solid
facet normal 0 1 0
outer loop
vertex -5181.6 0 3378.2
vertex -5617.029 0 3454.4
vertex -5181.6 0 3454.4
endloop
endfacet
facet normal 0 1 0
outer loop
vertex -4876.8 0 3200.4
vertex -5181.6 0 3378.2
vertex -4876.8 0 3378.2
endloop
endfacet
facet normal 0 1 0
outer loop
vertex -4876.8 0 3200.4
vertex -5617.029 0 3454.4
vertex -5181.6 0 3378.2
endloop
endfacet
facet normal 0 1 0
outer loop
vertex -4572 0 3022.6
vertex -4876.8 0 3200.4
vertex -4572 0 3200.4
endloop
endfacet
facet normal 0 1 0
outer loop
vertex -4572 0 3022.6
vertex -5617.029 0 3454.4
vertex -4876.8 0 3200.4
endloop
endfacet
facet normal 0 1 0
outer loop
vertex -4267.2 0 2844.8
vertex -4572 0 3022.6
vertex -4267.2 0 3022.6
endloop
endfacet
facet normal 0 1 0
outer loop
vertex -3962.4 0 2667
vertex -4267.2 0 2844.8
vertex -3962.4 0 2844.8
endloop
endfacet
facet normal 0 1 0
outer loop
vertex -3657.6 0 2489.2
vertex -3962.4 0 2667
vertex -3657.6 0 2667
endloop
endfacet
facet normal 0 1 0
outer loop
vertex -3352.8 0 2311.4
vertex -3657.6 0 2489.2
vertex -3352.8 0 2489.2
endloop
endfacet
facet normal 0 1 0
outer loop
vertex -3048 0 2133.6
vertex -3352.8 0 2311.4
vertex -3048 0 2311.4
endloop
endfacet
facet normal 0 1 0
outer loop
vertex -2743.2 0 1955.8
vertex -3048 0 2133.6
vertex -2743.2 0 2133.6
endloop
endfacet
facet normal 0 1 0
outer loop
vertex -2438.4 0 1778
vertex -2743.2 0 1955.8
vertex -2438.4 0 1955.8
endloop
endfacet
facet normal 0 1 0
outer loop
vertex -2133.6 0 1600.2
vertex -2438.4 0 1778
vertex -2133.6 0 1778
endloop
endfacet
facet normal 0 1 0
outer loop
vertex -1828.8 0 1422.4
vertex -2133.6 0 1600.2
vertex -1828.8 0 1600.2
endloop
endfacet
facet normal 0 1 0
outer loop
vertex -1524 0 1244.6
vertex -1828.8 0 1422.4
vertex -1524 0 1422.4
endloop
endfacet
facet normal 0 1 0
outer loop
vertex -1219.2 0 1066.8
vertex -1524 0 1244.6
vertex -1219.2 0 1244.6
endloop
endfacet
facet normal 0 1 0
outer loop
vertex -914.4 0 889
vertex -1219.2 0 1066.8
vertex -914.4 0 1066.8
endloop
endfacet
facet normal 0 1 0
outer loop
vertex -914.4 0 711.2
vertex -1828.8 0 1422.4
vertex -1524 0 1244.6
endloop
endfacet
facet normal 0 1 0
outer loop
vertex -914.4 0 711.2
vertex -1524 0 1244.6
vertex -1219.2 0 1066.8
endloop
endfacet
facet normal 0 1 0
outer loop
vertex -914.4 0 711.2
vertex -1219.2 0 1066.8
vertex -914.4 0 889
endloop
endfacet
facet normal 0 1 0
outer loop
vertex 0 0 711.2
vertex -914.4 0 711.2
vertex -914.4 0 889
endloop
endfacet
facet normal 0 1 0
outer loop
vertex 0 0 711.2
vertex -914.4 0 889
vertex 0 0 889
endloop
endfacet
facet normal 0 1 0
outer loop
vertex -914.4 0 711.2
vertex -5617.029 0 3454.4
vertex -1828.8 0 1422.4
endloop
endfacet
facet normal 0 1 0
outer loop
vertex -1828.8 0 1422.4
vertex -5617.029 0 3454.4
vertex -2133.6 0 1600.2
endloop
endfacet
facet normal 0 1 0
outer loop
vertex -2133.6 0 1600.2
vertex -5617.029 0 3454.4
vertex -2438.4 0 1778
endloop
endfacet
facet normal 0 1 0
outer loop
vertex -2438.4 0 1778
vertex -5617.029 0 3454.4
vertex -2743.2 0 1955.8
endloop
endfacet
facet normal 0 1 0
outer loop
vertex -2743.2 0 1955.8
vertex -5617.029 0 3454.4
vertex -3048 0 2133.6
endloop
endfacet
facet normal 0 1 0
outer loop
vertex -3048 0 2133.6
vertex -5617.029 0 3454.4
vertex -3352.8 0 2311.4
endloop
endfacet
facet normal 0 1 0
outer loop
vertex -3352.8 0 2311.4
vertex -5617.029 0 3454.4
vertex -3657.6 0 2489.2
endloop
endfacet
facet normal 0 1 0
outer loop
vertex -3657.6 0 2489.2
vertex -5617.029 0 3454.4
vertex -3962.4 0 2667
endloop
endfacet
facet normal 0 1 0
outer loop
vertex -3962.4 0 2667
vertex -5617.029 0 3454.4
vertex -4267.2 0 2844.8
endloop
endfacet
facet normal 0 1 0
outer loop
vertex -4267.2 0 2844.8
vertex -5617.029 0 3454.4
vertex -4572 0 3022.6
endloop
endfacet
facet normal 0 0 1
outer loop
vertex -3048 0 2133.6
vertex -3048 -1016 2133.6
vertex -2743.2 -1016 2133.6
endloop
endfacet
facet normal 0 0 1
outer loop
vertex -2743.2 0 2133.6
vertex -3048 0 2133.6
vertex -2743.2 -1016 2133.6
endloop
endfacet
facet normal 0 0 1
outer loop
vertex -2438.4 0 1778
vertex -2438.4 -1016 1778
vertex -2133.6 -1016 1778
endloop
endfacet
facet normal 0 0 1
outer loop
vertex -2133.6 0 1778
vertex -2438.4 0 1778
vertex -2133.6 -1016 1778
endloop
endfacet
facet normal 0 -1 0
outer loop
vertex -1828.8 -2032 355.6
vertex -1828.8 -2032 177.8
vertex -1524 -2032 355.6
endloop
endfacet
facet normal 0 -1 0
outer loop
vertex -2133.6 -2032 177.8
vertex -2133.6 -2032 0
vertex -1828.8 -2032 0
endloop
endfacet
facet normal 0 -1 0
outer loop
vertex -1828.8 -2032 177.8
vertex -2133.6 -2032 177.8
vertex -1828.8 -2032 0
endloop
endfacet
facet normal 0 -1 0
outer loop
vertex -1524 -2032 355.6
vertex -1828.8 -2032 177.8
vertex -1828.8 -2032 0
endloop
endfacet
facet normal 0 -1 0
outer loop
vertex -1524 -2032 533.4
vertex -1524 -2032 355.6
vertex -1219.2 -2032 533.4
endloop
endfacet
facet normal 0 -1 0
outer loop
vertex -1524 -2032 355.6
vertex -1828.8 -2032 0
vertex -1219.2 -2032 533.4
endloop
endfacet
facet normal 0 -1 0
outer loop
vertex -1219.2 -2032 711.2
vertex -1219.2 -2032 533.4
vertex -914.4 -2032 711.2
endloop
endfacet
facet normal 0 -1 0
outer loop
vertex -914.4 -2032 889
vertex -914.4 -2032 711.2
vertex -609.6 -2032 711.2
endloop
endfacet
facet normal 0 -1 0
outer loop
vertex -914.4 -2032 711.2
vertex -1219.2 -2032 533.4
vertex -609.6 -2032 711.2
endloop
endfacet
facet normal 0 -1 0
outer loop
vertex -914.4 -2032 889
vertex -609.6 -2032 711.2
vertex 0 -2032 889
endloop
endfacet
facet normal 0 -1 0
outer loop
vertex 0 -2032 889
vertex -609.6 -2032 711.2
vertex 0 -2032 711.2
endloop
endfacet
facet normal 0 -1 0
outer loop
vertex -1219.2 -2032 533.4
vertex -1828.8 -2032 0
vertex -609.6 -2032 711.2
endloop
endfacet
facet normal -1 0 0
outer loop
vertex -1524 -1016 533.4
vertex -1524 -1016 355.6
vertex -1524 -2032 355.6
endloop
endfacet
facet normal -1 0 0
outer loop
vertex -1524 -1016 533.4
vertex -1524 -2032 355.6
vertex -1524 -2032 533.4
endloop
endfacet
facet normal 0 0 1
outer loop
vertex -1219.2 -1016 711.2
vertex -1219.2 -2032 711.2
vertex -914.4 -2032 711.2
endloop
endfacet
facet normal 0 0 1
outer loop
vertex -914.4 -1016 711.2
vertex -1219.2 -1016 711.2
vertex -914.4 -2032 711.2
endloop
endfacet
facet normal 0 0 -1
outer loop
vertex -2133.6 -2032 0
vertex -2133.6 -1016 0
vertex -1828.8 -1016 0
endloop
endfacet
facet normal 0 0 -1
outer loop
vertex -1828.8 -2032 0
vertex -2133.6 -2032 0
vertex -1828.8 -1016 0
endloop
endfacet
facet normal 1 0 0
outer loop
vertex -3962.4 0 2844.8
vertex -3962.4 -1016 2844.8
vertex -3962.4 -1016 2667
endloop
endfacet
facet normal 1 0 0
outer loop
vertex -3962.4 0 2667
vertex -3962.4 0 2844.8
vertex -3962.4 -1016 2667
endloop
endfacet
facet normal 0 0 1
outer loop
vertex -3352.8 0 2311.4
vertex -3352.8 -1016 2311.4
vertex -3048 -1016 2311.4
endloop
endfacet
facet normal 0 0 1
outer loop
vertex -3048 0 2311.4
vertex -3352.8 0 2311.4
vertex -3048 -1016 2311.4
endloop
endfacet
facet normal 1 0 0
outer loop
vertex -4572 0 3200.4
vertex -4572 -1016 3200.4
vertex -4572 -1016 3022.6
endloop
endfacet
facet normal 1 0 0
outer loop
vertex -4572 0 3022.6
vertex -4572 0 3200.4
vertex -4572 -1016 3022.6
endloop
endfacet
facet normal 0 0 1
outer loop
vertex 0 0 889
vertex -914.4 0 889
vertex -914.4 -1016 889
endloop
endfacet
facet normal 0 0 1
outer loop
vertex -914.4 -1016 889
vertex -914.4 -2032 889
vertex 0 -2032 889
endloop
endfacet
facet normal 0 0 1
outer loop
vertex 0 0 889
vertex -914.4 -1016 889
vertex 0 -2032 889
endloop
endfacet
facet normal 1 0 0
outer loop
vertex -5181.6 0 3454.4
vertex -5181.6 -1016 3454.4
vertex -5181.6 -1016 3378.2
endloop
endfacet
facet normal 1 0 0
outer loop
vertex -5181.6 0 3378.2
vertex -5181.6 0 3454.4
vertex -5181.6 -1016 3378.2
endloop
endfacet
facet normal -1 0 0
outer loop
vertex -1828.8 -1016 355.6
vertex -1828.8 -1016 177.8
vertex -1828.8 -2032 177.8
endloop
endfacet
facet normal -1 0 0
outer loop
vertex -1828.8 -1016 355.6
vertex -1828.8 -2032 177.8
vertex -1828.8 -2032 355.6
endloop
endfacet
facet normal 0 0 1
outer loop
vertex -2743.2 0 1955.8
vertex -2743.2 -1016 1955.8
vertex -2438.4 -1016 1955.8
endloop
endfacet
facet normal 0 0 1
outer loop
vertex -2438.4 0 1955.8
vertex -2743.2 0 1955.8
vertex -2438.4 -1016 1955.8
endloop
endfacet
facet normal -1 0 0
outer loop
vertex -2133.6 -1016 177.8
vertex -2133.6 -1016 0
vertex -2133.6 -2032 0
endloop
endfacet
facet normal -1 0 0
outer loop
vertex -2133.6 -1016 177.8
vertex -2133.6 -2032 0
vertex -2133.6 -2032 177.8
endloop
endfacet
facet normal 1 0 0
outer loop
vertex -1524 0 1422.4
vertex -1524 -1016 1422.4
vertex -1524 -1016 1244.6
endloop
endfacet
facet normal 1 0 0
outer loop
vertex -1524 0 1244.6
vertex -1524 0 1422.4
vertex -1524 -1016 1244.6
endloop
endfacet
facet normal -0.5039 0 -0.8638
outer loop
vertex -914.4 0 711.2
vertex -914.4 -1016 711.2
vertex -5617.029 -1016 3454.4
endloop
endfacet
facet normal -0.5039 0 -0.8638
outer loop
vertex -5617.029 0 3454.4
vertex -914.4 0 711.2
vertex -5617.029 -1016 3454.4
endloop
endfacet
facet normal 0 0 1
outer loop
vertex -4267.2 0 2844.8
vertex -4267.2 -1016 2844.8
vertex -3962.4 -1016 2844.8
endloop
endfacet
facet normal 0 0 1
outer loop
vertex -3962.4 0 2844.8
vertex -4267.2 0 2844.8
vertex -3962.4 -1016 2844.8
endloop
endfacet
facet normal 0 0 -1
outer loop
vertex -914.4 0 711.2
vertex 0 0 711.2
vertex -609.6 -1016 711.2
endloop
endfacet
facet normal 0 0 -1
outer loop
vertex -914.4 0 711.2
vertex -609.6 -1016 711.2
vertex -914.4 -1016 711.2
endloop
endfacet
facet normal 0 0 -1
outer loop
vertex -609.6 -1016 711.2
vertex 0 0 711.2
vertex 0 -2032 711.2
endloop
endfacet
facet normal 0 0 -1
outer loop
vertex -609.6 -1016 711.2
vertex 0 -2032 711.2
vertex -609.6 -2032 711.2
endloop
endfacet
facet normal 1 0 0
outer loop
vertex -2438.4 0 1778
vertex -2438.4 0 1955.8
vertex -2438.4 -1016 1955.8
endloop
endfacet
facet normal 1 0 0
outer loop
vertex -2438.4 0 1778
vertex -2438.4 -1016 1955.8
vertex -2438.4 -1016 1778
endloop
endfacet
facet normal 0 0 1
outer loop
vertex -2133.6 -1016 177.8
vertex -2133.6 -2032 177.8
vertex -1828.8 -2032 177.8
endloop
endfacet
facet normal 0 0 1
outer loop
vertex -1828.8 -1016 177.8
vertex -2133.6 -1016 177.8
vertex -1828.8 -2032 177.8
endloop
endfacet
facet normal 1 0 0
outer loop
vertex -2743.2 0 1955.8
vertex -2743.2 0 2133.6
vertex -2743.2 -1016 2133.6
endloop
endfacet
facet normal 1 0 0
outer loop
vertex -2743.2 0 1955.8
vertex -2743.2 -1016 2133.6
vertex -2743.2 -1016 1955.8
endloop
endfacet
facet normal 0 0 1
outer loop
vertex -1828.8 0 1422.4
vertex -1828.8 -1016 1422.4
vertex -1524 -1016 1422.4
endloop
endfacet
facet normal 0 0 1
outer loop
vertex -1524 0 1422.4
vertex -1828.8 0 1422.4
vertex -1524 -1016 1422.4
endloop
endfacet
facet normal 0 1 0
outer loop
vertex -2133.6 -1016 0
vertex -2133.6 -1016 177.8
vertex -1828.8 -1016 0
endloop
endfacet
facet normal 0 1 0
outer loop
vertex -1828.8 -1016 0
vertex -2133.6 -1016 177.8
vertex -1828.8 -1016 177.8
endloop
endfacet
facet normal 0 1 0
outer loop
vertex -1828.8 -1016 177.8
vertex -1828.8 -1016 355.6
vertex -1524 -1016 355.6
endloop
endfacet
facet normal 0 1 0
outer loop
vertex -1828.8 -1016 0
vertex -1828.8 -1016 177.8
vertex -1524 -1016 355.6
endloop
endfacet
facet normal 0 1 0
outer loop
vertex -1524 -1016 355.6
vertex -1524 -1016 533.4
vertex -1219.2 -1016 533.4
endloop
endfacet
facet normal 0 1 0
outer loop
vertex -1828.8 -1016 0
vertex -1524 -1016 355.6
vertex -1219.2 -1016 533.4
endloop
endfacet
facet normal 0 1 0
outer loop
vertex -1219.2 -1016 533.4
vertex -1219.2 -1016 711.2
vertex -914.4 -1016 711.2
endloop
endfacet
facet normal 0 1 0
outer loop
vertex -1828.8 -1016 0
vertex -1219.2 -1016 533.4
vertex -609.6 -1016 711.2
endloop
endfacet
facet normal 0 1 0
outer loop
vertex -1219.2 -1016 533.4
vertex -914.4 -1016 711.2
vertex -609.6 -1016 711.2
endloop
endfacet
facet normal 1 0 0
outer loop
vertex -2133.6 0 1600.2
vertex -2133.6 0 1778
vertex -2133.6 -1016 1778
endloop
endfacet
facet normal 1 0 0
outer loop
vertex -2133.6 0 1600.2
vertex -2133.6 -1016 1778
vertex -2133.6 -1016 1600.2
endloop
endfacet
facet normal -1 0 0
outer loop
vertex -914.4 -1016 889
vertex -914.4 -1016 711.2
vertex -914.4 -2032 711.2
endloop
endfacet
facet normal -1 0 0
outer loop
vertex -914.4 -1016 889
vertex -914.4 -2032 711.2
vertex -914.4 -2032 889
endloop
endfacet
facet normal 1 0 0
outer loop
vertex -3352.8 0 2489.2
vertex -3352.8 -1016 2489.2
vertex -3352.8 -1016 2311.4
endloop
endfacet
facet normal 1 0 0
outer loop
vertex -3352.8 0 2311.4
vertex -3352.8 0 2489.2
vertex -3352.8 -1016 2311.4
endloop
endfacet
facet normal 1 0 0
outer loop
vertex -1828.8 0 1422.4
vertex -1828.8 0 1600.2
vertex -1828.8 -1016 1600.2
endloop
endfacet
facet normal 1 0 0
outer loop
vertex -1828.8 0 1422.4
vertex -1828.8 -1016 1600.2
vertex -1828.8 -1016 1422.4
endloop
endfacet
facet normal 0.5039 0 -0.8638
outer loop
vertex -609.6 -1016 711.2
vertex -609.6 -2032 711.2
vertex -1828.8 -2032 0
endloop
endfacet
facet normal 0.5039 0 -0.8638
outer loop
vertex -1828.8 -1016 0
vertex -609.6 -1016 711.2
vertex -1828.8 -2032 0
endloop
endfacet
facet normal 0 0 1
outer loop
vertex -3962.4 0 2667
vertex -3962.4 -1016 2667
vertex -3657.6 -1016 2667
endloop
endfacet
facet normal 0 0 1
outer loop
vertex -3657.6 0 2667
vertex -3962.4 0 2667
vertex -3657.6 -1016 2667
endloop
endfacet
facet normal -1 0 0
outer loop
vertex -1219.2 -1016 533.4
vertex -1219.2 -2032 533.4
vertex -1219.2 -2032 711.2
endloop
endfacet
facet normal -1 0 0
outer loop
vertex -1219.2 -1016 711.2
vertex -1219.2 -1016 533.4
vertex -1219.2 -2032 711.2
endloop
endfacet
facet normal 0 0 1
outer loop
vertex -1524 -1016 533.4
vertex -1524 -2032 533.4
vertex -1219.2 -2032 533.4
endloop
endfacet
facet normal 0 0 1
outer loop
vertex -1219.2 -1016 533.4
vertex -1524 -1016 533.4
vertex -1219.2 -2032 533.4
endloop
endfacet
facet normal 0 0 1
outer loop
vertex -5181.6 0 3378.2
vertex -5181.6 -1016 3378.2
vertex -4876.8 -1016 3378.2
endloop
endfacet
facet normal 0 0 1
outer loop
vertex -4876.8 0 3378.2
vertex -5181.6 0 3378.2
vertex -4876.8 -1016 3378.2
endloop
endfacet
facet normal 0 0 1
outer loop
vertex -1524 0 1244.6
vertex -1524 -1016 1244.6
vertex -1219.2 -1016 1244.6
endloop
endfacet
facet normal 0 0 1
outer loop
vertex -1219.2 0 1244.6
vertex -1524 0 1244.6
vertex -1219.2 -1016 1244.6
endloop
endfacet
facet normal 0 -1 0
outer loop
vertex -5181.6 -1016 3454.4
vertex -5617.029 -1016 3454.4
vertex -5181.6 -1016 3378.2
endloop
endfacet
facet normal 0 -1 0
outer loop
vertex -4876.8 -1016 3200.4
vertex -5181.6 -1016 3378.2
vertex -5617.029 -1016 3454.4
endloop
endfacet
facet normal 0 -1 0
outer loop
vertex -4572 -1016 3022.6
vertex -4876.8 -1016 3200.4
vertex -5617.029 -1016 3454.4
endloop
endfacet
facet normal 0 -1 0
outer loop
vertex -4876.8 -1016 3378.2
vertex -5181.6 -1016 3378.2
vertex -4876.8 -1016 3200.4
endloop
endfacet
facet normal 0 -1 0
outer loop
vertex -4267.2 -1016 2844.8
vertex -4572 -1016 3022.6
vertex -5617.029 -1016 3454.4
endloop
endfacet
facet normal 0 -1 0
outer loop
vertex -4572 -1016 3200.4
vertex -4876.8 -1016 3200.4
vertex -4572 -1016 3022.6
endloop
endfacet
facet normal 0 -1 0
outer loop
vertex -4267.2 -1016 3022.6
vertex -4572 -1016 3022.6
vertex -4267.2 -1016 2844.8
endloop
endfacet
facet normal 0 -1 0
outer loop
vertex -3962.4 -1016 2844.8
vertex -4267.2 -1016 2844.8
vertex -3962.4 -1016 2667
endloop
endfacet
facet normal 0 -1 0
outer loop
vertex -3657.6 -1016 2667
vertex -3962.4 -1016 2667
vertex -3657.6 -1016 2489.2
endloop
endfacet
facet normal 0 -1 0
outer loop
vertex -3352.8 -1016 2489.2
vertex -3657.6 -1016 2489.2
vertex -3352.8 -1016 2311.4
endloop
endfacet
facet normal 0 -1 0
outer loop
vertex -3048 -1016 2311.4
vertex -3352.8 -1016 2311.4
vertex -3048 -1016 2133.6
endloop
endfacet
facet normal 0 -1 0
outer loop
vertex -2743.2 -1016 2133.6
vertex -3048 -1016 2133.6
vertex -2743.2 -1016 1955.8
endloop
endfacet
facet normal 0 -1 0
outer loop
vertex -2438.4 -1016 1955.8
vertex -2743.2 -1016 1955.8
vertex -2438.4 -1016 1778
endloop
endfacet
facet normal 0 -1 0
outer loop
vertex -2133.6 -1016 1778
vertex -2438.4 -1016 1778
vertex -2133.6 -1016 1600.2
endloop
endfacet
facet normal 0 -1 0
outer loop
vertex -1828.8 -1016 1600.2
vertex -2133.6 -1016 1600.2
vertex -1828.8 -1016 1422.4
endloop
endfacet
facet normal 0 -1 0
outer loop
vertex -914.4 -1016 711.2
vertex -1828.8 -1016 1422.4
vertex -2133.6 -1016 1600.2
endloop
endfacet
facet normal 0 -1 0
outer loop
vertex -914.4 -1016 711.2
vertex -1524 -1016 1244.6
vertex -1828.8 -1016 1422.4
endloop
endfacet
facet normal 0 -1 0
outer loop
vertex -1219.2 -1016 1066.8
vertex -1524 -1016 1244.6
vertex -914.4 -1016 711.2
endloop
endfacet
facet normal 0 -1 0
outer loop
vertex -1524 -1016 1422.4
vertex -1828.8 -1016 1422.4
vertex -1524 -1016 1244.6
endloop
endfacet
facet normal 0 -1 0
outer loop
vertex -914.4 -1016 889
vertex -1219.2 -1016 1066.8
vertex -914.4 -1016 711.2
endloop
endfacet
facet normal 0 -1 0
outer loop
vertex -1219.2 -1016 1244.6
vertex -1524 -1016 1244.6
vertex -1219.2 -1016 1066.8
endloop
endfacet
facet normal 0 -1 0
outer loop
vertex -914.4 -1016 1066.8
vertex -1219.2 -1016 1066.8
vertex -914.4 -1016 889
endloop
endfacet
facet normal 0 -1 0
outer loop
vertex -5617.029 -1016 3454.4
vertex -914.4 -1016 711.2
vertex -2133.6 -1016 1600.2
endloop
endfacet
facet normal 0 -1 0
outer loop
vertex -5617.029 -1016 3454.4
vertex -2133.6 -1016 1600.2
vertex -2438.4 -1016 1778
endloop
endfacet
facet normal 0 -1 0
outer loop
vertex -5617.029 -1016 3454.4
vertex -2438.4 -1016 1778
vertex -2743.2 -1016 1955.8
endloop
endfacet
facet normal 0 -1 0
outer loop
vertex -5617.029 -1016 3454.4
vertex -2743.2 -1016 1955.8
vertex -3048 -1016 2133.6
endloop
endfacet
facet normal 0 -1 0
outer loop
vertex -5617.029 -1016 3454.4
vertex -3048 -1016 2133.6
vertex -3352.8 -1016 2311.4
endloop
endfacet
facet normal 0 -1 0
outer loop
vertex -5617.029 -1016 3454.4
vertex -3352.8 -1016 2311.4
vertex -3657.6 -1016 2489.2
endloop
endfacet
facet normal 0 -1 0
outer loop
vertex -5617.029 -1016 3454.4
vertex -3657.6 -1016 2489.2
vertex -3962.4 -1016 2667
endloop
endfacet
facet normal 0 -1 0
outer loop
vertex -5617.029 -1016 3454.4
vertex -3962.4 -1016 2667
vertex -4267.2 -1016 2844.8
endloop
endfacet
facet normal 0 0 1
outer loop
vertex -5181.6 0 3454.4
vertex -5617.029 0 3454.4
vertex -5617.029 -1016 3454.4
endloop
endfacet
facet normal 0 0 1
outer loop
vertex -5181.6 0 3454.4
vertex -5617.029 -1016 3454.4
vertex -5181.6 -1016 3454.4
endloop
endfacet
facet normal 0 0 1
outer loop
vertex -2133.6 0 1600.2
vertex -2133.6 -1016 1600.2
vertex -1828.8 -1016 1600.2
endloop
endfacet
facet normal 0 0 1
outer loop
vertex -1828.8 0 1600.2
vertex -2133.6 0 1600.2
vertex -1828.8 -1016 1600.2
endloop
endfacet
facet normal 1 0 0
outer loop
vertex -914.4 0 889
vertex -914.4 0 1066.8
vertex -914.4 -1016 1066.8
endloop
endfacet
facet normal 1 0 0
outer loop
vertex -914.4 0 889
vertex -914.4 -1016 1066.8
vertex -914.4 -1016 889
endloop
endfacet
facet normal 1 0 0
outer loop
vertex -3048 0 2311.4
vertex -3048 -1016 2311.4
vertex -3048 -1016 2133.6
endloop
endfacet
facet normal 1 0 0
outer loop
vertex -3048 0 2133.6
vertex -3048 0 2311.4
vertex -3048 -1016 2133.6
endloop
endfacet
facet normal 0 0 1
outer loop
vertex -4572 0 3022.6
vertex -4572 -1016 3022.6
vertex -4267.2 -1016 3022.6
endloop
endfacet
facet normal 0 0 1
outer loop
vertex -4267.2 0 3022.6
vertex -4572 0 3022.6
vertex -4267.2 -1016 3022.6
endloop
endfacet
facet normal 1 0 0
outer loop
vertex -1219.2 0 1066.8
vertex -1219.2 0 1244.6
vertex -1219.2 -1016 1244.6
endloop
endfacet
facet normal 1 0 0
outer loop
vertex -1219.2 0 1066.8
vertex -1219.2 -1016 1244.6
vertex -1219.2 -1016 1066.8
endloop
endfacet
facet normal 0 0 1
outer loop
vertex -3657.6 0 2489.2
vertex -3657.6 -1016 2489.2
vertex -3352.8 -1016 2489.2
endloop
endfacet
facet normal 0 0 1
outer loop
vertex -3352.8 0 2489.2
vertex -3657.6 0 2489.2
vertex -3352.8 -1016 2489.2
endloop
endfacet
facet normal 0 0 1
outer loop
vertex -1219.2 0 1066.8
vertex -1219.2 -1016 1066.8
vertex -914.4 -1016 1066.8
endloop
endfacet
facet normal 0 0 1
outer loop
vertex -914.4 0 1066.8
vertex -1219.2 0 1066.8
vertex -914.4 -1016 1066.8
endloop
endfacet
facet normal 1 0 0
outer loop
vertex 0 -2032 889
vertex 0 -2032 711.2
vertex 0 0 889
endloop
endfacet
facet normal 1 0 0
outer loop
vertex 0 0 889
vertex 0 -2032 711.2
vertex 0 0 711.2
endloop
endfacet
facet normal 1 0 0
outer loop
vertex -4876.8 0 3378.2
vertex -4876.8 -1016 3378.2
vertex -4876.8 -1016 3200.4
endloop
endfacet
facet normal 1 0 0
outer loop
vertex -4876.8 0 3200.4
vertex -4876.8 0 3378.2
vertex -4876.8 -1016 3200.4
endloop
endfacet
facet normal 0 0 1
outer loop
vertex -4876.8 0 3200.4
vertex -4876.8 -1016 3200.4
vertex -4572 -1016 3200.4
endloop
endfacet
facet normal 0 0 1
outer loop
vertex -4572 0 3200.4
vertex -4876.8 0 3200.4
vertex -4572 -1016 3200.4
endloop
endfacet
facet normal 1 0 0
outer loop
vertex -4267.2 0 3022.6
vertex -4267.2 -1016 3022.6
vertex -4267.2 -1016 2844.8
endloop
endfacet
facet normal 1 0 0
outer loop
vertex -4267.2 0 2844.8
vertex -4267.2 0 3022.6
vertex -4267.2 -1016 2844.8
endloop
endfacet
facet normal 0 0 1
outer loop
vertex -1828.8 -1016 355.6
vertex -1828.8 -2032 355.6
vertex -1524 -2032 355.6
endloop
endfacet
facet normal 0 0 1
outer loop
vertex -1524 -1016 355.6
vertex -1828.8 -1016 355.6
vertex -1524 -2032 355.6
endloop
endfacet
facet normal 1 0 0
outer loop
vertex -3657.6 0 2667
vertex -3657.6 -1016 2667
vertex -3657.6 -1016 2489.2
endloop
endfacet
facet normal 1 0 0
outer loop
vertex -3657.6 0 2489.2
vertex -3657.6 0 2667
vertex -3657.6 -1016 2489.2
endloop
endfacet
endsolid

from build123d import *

# Parameters (mm, degrees)
F0_W     = 9144
F0_H     = 2032
F1_DEPTH = 3454.4
F3_DEPTH = 1016
F5_DEPTH = 1016


# Not quite as in the source:
# - a feature names something its author has since deleted; it is built from what else it names


with BuildPart() as f1:
    # F0 (on Top) → F1 (new body)
    with BuildSketch(Plane.XY):
        with Locations((-4572, -1016)):
            Rectangle(F0_W, F0_H)
    extrude(amount=F1_DEPTH)

    # F2 (on face) → F3 (cut)
    with BuildSketch(Plane.XZ.offset(2032)):
        Polygon((-2341.2702168835, 0), (-2133.6, 0), (-2133.6, 177.8), (-1828.8, 177.8), (-1828.8, 355.6), (-1524, 355.6), (-1524, 533.4), (-1219.2, 533.4), (-1219.2, 711.2), (-914.4, 711.2), (-914.4, 889), (0, 889), (0, 3454.4), (-9144, 3454.4), (-9144, 0), align=None)
        Polygon((-609.6, 711.2), (-1828.8, 0), (0, 0), (0, 711.2), align=None)
    extrude(amount=-F3_DEPTH, mode=Mode.SUBTRACT)

    # F4 (on face) → F5 (cut, through all)
    with BuildSketch(Plane.XZ.offset(1016)):
        Polygon((-1219.2, 711.2), (-914.4, 711.2), (-5617.0285714286, 3454.4), (-9144, 3454.4), (-9144, 0), (-2133.6, 0), (-2133.6, 177.8), (-1828.8, 177.8), (-1828.8, 355.6), (-1524, 355.6), (-1524, 533.4), (-1219.2, 533.4), align=None)
        Polygon((-914.4, 1066.8), (-914.4, 889), (0, 889), (0, 3454.4), (-5181.6, 3454.4), (-5181.6, 3378.2), (-4876.8, 3378.2), (-4876.8, 3200.4), (-4572, 3200.4), (-4572, 3022.6), (-4267.2, 3022.6), (-4267.2, 2844.8), (-3962.4, 2844.8), (-3962.4, 2667), (-3657.6, 2667), (-3657.6, 2489.2), (-3352.8, 2489.2), (-3352.8, 2311.4), (-3048, 2311.4), (-3048, 2133.6), (-2743.2, 2133.6), (-2743.2, 1955.8), (-2438.4, 1955.8), (-2438.4, 1778), (-2133.6, 1778), (-2133.6, 1600.2), (-1828.8, 1600.2), (-1828.8, 1422.4), (-1524, 1422.4), (-1524, 1244.6), (-1219.2, 1244.6), (-1219.2, 1066.8), align=None)
        Polygon((0, 711.2), (-914.4, 711.2), (-1219.2, 711.2), (-1219.2, 533.4), (-1524, 533.4), (-1524, 355.6), (-1828.8, 355.6), (-1828.8, 177.8), (-2133.6, 177.8), (-2133.6, 0), (0, 0), align=None)
    extrude(amount=-F5_DEPTH, mode=Mode.SUBTRACT)


solid = f1.part
